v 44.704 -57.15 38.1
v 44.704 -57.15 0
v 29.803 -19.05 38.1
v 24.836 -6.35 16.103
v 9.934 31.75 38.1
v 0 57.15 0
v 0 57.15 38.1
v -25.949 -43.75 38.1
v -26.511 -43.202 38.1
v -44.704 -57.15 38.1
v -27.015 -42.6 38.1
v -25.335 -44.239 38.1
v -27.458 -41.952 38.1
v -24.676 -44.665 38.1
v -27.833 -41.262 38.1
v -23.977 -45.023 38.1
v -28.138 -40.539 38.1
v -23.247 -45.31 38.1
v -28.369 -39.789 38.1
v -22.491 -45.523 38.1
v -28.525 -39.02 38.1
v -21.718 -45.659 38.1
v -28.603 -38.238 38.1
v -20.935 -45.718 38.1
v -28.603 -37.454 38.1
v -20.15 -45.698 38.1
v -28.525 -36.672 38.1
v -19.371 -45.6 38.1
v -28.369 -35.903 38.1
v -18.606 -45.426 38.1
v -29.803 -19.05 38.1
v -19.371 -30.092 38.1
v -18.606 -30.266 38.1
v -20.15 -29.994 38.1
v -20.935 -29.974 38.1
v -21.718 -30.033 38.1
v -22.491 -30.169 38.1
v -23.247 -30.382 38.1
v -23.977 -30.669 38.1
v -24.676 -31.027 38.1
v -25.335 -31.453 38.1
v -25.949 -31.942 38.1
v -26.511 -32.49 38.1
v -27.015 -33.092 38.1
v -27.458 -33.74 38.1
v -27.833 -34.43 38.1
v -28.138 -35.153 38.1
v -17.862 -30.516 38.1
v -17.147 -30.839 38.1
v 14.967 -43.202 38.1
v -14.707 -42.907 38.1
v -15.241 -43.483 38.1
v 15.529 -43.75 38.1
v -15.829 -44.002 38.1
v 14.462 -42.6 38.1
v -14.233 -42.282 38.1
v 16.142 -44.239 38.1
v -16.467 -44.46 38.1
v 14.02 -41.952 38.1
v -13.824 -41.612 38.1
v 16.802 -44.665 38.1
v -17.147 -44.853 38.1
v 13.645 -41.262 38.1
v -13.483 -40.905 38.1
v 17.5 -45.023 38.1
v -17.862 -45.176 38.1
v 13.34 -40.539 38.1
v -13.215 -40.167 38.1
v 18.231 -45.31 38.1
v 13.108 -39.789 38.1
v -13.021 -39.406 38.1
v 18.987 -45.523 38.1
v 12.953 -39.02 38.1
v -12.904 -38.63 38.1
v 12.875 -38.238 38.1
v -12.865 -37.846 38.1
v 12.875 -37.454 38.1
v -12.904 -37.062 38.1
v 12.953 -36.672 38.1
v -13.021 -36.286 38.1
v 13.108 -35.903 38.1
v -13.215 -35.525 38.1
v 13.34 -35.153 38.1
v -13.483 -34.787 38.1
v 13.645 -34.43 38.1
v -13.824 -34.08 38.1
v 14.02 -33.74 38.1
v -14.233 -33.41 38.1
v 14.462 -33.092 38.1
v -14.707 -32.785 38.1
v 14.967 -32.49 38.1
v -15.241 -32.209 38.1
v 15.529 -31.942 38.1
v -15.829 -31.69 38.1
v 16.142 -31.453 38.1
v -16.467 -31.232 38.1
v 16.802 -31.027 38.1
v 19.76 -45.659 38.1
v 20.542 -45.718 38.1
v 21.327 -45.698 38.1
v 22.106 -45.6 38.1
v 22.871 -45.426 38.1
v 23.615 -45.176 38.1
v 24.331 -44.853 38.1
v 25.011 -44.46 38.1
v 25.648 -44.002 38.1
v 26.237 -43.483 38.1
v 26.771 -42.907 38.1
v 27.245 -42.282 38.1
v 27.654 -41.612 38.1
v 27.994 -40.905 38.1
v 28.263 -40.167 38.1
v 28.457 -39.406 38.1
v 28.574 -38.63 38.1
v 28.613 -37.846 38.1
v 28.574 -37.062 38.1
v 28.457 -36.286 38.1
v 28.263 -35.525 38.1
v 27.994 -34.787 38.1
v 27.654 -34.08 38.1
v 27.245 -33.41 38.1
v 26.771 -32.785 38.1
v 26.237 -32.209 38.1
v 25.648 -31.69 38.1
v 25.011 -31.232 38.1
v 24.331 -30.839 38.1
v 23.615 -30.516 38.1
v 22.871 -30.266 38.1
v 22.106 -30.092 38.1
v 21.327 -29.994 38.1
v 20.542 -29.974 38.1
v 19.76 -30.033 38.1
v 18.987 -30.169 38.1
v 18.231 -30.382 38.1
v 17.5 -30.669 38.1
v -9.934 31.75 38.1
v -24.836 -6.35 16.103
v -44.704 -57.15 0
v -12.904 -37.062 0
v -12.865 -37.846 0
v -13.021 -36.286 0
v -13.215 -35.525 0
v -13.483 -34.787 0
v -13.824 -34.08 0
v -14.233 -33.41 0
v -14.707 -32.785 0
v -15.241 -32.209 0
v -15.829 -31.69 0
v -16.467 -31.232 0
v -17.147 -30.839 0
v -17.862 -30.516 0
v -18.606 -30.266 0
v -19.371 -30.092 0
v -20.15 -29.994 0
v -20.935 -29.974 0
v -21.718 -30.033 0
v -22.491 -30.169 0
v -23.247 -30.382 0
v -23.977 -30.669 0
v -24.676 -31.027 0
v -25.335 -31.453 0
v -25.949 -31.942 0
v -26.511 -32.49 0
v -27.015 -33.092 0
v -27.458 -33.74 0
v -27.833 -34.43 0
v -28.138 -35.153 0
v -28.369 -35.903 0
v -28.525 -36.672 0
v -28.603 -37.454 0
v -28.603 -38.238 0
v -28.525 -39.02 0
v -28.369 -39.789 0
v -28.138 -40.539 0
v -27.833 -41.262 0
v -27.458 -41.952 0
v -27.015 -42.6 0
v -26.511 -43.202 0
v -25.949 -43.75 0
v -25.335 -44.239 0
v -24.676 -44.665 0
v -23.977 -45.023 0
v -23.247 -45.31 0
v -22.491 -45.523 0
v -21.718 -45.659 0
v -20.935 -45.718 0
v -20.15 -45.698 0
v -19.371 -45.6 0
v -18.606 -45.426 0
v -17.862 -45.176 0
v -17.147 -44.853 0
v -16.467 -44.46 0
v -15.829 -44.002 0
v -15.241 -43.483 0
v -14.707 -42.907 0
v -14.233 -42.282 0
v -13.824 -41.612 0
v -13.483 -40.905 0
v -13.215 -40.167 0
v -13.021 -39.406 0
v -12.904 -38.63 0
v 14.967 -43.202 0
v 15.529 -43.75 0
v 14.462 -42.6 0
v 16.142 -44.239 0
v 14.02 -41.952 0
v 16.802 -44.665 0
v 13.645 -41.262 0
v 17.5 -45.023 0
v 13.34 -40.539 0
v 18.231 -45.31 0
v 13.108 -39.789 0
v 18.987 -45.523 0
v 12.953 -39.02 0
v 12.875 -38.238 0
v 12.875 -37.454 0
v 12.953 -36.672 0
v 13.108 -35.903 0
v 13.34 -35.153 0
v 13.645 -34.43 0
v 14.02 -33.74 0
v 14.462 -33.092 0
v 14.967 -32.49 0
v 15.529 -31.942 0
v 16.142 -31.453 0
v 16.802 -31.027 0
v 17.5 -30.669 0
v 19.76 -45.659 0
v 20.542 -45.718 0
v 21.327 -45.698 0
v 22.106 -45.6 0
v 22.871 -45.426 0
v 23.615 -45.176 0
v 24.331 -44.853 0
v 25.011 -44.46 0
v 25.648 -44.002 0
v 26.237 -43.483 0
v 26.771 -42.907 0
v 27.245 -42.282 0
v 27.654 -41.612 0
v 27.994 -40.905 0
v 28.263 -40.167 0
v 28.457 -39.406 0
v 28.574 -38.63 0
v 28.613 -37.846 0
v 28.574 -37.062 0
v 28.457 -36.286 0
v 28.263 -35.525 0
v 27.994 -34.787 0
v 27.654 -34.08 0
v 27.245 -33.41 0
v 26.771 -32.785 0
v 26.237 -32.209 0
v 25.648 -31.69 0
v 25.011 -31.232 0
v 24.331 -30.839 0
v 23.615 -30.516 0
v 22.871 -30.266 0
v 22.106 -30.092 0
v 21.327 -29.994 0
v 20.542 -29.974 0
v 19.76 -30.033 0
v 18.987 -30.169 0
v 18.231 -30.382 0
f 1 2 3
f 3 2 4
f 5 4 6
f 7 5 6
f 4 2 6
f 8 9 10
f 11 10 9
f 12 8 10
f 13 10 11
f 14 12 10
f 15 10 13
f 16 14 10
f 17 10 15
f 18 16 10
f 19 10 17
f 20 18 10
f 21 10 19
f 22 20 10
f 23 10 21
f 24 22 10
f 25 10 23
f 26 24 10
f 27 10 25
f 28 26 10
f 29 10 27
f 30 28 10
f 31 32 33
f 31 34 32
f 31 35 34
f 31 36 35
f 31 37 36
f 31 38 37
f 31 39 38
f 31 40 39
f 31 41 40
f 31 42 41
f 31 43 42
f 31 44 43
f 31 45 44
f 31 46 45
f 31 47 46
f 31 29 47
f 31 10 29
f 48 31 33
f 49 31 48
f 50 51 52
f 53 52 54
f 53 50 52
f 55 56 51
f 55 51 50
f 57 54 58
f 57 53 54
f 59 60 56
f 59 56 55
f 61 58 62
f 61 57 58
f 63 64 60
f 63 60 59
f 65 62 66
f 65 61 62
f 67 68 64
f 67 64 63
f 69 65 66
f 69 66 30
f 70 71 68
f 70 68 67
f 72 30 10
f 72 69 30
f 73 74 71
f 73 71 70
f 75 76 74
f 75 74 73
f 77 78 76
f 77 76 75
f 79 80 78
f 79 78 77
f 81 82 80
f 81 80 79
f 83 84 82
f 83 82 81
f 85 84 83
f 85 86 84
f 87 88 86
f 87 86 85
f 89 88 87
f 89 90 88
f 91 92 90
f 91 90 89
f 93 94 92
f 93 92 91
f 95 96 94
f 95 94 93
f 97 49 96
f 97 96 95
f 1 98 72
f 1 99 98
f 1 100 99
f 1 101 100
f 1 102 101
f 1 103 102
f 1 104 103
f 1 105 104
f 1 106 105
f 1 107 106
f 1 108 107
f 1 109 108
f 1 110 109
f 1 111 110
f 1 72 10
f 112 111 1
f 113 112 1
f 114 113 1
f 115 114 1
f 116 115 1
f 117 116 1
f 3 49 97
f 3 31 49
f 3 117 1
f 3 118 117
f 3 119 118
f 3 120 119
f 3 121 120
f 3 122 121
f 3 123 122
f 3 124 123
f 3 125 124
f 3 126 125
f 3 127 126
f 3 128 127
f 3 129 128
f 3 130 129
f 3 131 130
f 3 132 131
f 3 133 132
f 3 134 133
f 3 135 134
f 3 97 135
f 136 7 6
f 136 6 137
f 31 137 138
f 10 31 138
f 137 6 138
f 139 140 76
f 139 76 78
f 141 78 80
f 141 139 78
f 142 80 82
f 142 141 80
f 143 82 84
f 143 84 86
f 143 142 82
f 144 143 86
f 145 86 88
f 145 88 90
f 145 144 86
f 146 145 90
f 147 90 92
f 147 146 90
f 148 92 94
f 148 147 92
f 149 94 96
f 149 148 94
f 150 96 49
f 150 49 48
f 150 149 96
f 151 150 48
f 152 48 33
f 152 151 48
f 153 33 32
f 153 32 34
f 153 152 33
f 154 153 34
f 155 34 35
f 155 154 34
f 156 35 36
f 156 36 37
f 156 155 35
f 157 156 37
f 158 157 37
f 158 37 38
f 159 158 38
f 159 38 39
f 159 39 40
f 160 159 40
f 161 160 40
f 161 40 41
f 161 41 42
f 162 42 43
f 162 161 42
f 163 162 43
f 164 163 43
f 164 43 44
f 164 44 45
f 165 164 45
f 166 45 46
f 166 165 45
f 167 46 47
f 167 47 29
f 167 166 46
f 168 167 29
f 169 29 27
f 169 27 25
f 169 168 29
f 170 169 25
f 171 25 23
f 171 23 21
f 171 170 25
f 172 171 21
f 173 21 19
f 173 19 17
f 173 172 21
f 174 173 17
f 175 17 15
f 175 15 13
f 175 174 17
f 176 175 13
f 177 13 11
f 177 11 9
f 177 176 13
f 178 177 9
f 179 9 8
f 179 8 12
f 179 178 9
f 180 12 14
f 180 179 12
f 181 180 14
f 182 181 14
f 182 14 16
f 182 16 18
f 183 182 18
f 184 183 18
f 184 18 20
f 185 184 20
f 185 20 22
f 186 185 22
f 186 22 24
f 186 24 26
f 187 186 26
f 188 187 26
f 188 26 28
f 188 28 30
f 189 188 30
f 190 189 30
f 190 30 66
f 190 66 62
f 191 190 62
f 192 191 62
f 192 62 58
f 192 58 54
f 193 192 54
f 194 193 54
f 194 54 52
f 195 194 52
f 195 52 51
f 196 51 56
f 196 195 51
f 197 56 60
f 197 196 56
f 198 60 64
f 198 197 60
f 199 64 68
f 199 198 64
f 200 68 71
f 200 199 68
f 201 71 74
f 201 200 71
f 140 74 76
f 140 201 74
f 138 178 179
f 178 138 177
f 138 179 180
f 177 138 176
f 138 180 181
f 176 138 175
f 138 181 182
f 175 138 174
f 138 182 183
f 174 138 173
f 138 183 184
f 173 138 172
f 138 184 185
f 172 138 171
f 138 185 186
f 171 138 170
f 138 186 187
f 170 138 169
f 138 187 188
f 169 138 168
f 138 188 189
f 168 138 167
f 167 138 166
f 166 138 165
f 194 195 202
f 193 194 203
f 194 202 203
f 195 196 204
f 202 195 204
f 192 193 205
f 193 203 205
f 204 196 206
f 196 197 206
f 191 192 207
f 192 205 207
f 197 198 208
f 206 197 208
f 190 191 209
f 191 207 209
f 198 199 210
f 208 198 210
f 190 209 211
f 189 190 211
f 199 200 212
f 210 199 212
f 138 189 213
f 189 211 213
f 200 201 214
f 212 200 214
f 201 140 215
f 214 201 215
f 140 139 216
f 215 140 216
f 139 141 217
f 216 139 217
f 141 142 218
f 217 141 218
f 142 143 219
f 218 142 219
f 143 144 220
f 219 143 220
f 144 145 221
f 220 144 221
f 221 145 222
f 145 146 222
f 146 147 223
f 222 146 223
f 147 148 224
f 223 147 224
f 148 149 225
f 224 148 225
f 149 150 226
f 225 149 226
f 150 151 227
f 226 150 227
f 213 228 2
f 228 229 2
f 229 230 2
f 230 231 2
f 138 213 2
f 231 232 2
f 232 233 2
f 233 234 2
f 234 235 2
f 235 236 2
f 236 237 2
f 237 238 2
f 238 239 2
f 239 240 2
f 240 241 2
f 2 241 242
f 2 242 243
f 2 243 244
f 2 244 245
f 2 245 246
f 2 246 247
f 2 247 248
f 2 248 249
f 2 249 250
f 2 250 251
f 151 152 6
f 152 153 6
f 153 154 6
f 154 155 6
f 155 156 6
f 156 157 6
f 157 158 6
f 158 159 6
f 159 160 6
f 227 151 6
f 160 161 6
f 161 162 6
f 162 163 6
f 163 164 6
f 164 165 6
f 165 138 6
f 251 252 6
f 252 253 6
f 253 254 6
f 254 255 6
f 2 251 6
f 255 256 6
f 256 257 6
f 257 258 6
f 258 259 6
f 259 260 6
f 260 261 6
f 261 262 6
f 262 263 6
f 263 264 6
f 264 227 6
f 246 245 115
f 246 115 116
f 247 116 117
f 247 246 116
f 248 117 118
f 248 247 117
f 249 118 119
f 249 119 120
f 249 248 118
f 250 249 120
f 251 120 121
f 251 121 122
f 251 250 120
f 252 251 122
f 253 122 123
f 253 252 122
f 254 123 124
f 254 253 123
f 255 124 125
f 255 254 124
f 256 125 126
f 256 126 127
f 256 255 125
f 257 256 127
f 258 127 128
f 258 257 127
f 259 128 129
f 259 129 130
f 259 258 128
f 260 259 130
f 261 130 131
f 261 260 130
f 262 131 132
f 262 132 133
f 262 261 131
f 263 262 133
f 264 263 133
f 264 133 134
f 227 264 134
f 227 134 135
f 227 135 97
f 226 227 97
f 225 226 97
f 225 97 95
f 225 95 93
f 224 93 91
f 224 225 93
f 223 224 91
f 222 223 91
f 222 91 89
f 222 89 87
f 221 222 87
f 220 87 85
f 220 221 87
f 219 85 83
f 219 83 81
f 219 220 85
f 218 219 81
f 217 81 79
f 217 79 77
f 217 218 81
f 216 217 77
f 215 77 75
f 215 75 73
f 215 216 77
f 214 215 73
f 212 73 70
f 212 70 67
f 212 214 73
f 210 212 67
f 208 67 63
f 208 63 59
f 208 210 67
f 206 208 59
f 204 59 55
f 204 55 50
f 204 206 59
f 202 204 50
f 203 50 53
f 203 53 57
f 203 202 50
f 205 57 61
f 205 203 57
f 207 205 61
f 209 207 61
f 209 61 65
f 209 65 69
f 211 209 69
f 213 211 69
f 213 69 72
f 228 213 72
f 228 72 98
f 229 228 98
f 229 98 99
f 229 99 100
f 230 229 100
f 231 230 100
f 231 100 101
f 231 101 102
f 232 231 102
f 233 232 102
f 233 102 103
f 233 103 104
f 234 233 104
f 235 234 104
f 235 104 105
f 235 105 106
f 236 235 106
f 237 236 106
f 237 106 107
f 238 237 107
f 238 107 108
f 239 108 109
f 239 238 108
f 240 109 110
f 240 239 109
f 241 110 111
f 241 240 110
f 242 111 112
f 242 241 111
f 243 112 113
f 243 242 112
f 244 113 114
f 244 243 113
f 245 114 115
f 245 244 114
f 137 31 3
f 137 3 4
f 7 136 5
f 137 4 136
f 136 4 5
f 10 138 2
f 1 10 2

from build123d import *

# Parameters (mm, degrees)
F0_R     = 7.874
F1_DEPTH = 38.1
F4_DEPTH = 89.408


with BuildPart() as f1:
    # F0 (on Top) → F1 (new body)
    with BuildSketch(Plane.XY):
        Polygon((0, 57.15), (-44.704, -57.15), (44.704, -57.15), align=None)
        with Locations((-20.738764, -37.846)):
            Circle(F0_R, mode=Mode.SUBTRACT)
        with Locations((20.738764, -37.846)):
            Circle(F0_R, mode=Mode.SUBTRACT)
    extrude(amount=F1_DEPTH)

    # F3 (on offset) → F4 (cut)
    with BuildSketch(Plane.YZ.offset(44.704)):
        Polygon((31.75, 38.1), (-19.05, 38.1), (-6.35, 16.102955), align=None)
    extrude(amount=-F4_DEPTH, mode=Mode.SUBTRACT)


solid = f1.part
